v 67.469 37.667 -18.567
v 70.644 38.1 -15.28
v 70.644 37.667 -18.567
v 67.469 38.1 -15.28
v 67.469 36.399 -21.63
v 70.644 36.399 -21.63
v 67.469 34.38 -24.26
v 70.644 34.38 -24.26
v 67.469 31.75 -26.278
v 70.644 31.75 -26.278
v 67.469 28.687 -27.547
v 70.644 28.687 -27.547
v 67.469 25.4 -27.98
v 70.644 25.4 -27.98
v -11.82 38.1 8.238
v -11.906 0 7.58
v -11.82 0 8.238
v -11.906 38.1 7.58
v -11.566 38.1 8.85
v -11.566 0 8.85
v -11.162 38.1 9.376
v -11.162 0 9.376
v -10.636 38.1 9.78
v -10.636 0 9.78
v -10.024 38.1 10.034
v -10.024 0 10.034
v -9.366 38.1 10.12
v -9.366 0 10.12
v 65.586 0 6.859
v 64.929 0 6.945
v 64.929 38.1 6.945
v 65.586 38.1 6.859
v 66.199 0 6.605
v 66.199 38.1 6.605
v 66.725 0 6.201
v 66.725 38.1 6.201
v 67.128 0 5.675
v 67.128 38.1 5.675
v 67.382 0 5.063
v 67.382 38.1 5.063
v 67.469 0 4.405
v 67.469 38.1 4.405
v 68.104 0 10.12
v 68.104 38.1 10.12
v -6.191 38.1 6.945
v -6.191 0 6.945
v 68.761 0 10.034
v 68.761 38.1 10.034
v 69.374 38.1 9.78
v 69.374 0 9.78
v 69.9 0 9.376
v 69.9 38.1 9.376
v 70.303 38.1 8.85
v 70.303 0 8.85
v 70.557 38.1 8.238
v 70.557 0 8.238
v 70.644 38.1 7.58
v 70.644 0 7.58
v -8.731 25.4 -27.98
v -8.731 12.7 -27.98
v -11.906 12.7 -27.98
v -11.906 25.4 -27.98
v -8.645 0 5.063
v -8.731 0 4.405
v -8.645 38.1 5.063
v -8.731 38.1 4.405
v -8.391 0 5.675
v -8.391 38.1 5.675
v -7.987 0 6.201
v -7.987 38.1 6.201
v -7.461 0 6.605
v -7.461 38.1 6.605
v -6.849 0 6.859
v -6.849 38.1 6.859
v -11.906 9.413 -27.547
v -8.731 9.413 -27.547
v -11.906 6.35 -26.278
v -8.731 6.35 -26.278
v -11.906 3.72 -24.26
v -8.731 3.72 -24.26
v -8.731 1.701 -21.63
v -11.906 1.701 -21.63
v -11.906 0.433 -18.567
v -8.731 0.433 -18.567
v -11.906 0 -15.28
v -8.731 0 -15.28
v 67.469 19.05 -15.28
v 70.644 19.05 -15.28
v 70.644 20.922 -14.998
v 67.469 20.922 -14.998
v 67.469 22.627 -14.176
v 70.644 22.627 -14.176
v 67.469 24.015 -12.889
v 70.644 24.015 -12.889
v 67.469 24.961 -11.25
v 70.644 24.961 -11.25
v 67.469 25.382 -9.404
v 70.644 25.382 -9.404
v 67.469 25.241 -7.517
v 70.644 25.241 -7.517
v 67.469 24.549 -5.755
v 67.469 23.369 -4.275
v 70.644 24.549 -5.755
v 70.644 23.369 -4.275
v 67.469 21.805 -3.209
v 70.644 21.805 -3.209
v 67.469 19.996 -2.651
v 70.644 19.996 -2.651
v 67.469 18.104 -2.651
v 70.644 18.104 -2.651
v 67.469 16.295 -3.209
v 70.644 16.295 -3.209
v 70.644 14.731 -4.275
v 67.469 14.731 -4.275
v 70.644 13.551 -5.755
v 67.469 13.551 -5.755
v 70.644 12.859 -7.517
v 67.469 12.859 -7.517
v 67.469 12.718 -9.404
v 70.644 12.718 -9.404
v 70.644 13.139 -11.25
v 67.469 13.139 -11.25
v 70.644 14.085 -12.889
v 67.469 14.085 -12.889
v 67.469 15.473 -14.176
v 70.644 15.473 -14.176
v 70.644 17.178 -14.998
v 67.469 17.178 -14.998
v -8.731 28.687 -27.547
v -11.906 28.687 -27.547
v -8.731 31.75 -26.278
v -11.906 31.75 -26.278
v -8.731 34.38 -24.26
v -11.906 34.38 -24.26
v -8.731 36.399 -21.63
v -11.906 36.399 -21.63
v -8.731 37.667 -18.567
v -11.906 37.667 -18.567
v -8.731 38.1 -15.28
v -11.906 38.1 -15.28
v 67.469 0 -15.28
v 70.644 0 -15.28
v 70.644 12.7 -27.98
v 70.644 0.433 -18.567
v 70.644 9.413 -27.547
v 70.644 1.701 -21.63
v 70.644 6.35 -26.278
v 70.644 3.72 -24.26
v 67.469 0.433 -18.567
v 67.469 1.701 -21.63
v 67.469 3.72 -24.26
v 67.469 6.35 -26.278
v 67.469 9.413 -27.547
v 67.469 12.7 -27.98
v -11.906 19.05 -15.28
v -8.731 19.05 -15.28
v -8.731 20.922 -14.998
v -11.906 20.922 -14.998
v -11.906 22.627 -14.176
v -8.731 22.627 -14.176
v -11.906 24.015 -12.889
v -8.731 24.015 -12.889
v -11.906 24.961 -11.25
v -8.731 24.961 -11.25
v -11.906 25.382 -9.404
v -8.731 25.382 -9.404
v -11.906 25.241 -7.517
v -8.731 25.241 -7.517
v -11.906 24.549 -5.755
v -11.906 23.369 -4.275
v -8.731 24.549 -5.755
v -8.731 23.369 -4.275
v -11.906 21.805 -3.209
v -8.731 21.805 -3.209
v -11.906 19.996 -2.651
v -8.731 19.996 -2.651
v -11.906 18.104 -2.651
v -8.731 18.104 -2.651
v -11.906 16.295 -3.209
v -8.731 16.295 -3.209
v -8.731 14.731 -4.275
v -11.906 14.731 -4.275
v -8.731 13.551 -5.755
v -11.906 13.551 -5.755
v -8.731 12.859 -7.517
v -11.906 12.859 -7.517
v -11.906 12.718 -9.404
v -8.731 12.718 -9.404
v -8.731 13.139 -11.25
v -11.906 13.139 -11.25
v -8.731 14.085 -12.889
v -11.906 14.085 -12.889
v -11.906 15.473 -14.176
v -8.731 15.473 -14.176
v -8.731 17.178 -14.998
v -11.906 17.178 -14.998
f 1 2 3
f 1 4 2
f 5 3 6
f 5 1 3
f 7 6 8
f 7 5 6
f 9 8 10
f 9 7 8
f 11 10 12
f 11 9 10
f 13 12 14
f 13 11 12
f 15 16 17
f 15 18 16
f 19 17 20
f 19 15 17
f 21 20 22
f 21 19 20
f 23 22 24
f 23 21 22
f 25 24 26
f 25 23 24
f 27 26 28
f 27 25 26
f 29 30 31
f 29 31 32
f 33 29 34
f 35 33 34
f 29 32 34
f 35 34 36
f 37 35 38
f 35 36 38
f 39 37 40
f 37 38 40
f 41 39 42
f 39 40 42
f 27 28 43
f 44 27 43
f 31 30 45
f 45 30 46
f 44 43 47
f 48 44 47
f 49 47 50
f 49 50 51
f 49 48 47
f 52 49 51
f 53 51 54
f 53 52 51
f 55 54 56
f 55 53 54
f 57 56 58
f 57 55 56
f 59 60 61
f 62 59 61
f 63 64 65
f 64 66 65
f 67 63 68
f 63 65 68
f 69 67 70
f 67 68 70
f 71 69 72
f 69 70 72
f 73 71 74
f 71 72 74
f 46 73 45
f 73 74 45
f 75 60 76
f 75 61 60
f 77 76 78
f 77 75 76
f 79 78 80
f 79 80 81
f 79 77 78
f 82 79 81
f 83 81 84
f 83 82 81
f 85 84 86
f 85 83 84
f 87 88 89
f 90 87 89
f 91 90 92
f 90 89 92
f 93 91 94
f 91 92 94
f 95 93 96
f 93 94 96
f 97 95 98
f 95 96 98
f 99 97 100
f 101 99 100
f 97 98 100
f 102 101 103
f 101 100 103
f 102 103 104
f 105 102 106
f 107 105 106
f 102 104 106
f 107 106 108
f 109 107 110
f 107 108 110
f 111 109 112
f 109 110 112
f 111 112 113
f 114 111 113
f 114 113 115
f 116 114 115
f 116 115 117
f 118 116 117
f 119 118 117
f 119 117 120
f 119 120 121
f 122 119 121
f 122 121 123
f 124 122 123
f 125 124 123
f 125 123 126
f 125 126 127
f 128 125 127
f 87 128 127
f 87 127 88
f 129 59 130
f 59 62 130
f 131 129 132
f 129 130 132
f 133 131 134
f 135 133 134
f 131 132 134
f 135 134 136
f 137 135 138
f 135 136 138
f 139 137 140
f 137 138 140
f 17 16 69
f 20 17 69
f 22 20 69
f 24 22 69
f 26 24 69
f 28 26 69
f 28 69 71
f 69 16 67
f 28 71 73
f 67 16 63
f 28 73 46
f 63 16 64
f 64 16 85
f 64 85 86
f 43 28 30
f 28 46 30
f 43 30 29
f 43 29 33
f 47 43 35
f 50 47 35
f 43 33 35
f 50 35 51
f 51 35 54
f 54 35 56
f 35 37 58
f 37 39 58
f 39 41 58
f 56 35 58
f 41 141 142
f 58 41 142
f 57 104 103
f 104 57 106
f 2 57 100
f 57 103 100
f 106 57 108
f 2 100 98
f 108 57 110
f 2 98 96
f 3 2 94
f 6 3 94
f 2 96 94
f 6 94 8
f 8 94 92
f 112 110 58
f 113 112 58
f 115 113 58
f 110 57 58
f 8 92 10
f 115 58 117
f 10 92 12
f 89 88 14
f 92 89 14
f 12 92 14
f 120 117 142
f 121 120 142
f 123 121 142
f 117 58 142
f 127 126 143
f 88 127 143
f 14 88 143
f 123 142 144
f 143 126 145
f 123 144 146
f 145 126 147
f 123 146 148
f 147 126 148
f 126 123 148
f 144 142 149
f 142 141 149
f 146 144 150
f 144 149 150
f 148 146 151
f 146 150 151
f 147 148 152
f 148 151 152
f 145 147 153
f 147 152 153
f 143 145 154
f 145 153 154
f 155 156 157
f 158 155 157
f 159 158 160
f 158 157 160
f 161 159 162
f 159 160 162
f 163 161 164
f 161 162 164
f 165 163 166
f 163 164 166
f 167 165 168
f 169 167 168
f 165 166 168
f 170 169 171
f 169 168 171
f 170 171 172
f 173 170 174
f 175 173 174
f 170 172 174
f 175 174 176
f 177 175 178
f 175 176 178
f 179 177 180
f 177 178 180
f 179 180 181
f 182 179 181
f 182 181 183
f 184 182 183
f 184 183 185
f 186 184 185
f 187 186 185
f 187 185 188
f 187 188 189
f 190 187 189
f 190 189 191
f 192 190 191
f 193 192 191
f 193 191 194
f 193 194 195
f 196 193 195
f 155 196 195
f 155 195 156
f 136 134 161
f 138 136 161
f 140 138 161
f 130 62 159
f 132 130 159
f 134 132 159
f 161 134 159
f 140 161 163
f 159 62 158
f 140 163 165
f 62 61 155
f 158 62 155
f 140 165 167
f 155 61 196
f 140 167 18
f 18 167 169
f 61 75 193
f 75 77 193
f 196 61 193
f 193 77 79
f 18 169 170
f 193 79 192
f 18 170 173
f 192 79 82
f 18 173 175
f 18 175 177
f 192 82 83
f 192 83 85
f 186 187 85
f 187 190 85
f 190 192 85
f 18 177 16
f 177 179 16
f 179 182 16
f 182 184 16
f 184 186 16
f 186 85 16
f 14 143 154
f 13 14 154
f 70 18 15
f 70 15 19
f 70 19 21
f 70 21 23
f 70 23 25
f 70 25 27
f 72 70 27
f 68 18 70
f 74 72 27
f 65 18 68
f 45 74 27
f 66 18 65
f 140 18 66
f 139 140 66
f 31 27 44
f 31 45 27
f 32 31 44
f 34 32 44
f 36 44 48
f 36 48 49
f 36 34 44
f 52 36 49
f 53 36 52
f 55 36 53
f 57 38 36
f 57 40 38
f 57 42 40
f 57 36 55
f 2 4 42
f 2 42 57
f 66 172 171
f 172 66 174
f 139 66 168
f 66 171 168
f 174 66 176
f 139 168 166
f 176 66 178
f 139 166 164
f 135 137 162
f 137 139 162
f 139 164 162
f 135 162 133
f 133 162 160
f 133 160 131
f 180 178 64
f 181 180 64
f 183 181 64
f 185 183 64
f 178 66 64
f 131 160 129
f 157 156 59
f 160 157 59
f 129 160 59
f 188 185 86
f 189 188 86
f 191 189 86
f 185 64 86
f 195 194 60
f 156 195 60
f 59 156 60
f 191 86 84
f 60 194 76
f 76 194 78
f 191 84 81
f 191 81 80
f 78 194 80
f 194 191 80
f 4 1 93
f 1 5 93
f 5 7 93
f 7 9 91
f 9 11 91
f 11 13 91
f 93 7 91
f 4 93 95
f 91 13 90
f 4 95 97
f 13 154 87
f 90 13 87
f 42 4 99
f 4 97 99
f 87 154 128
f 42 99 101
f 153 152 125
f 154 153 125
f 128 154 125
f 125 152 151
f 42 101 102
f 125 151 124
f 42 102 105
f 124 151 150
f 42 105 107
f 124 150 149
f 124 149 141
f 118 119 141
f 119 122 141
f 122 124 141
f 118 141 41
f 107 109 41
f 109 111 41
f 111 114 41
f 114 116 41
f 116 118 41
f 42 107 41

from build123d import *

# Parameters (mm, degrees)
BOSS_EXTRUDE1_DEPTH = 38.1
SKETCH4_R           = 6.35
CUT_EXTRUDE1_DEPTH  = 83.55
FILLET1_R           = 12.7
FILLET2_R           = 2.54


with BuildPart() as part:
    # Sketch1 → Boss-Extrude1 (new body)
    with BuildSketch(Plane(origin=(0, 0, 0), x_dir=(1, 0, 0), z_dir=(0, 1, 0))):
        Polygon((-11.90625, 27.9796875), (-11.90625, -10.1203125), (70.64375, -10.1203125), (70.64375, 27.9796875), (67.46875, 27.9796875), (67.46875, -6.9453125), (-8.73125, -6.9453125), (-8.73125, 27.9796875), align=None)
    extrude(amount=BOSS_EXTRUDE1_DEPTH)

    # Sketch4 → Cut-Extrude1 (cut, through all)
    with BuildSketch(Plane(origin=(70.64375, 0, 0), x_dir=(0, 0, -1), z_dir=(1, 0, 0))):
        with Locations((8.9296875, 19.05)):
            Circle(SKETCH4_R)
    extrude(amount=-CUT_EXTRUDE1_DEPTH, mode=Mode.SUBTRACT)

    # Fillet1
    fillet1_edges = [part.edges().sort_by_distance(p)[0] for p in [
        (-10.31875, 0, -27.9796875),
        (69.05625, 38.1, -27.9796875),
        (-10.31875, 38.1, -27.9796875),
        (69.05625, 0, -27.9796875),
    ]]
    fillet(fillet1_edges, radius=FILLET1_R)

    # Fillet2
    fillet2_edges = [part.edges().sort_by_distance(p)[0] for p in [
        (-8.73125, 19.05, 6.9453125),
        (67.46875, 19.05, 6.9453125),
        (70.64375, 19.05, 10.1203125),
        (-11.90625, 19.05, 10.1203125),
    ]]
    fillet(fillet2_edges, radius=FILLET2_R)


solid = part.part
